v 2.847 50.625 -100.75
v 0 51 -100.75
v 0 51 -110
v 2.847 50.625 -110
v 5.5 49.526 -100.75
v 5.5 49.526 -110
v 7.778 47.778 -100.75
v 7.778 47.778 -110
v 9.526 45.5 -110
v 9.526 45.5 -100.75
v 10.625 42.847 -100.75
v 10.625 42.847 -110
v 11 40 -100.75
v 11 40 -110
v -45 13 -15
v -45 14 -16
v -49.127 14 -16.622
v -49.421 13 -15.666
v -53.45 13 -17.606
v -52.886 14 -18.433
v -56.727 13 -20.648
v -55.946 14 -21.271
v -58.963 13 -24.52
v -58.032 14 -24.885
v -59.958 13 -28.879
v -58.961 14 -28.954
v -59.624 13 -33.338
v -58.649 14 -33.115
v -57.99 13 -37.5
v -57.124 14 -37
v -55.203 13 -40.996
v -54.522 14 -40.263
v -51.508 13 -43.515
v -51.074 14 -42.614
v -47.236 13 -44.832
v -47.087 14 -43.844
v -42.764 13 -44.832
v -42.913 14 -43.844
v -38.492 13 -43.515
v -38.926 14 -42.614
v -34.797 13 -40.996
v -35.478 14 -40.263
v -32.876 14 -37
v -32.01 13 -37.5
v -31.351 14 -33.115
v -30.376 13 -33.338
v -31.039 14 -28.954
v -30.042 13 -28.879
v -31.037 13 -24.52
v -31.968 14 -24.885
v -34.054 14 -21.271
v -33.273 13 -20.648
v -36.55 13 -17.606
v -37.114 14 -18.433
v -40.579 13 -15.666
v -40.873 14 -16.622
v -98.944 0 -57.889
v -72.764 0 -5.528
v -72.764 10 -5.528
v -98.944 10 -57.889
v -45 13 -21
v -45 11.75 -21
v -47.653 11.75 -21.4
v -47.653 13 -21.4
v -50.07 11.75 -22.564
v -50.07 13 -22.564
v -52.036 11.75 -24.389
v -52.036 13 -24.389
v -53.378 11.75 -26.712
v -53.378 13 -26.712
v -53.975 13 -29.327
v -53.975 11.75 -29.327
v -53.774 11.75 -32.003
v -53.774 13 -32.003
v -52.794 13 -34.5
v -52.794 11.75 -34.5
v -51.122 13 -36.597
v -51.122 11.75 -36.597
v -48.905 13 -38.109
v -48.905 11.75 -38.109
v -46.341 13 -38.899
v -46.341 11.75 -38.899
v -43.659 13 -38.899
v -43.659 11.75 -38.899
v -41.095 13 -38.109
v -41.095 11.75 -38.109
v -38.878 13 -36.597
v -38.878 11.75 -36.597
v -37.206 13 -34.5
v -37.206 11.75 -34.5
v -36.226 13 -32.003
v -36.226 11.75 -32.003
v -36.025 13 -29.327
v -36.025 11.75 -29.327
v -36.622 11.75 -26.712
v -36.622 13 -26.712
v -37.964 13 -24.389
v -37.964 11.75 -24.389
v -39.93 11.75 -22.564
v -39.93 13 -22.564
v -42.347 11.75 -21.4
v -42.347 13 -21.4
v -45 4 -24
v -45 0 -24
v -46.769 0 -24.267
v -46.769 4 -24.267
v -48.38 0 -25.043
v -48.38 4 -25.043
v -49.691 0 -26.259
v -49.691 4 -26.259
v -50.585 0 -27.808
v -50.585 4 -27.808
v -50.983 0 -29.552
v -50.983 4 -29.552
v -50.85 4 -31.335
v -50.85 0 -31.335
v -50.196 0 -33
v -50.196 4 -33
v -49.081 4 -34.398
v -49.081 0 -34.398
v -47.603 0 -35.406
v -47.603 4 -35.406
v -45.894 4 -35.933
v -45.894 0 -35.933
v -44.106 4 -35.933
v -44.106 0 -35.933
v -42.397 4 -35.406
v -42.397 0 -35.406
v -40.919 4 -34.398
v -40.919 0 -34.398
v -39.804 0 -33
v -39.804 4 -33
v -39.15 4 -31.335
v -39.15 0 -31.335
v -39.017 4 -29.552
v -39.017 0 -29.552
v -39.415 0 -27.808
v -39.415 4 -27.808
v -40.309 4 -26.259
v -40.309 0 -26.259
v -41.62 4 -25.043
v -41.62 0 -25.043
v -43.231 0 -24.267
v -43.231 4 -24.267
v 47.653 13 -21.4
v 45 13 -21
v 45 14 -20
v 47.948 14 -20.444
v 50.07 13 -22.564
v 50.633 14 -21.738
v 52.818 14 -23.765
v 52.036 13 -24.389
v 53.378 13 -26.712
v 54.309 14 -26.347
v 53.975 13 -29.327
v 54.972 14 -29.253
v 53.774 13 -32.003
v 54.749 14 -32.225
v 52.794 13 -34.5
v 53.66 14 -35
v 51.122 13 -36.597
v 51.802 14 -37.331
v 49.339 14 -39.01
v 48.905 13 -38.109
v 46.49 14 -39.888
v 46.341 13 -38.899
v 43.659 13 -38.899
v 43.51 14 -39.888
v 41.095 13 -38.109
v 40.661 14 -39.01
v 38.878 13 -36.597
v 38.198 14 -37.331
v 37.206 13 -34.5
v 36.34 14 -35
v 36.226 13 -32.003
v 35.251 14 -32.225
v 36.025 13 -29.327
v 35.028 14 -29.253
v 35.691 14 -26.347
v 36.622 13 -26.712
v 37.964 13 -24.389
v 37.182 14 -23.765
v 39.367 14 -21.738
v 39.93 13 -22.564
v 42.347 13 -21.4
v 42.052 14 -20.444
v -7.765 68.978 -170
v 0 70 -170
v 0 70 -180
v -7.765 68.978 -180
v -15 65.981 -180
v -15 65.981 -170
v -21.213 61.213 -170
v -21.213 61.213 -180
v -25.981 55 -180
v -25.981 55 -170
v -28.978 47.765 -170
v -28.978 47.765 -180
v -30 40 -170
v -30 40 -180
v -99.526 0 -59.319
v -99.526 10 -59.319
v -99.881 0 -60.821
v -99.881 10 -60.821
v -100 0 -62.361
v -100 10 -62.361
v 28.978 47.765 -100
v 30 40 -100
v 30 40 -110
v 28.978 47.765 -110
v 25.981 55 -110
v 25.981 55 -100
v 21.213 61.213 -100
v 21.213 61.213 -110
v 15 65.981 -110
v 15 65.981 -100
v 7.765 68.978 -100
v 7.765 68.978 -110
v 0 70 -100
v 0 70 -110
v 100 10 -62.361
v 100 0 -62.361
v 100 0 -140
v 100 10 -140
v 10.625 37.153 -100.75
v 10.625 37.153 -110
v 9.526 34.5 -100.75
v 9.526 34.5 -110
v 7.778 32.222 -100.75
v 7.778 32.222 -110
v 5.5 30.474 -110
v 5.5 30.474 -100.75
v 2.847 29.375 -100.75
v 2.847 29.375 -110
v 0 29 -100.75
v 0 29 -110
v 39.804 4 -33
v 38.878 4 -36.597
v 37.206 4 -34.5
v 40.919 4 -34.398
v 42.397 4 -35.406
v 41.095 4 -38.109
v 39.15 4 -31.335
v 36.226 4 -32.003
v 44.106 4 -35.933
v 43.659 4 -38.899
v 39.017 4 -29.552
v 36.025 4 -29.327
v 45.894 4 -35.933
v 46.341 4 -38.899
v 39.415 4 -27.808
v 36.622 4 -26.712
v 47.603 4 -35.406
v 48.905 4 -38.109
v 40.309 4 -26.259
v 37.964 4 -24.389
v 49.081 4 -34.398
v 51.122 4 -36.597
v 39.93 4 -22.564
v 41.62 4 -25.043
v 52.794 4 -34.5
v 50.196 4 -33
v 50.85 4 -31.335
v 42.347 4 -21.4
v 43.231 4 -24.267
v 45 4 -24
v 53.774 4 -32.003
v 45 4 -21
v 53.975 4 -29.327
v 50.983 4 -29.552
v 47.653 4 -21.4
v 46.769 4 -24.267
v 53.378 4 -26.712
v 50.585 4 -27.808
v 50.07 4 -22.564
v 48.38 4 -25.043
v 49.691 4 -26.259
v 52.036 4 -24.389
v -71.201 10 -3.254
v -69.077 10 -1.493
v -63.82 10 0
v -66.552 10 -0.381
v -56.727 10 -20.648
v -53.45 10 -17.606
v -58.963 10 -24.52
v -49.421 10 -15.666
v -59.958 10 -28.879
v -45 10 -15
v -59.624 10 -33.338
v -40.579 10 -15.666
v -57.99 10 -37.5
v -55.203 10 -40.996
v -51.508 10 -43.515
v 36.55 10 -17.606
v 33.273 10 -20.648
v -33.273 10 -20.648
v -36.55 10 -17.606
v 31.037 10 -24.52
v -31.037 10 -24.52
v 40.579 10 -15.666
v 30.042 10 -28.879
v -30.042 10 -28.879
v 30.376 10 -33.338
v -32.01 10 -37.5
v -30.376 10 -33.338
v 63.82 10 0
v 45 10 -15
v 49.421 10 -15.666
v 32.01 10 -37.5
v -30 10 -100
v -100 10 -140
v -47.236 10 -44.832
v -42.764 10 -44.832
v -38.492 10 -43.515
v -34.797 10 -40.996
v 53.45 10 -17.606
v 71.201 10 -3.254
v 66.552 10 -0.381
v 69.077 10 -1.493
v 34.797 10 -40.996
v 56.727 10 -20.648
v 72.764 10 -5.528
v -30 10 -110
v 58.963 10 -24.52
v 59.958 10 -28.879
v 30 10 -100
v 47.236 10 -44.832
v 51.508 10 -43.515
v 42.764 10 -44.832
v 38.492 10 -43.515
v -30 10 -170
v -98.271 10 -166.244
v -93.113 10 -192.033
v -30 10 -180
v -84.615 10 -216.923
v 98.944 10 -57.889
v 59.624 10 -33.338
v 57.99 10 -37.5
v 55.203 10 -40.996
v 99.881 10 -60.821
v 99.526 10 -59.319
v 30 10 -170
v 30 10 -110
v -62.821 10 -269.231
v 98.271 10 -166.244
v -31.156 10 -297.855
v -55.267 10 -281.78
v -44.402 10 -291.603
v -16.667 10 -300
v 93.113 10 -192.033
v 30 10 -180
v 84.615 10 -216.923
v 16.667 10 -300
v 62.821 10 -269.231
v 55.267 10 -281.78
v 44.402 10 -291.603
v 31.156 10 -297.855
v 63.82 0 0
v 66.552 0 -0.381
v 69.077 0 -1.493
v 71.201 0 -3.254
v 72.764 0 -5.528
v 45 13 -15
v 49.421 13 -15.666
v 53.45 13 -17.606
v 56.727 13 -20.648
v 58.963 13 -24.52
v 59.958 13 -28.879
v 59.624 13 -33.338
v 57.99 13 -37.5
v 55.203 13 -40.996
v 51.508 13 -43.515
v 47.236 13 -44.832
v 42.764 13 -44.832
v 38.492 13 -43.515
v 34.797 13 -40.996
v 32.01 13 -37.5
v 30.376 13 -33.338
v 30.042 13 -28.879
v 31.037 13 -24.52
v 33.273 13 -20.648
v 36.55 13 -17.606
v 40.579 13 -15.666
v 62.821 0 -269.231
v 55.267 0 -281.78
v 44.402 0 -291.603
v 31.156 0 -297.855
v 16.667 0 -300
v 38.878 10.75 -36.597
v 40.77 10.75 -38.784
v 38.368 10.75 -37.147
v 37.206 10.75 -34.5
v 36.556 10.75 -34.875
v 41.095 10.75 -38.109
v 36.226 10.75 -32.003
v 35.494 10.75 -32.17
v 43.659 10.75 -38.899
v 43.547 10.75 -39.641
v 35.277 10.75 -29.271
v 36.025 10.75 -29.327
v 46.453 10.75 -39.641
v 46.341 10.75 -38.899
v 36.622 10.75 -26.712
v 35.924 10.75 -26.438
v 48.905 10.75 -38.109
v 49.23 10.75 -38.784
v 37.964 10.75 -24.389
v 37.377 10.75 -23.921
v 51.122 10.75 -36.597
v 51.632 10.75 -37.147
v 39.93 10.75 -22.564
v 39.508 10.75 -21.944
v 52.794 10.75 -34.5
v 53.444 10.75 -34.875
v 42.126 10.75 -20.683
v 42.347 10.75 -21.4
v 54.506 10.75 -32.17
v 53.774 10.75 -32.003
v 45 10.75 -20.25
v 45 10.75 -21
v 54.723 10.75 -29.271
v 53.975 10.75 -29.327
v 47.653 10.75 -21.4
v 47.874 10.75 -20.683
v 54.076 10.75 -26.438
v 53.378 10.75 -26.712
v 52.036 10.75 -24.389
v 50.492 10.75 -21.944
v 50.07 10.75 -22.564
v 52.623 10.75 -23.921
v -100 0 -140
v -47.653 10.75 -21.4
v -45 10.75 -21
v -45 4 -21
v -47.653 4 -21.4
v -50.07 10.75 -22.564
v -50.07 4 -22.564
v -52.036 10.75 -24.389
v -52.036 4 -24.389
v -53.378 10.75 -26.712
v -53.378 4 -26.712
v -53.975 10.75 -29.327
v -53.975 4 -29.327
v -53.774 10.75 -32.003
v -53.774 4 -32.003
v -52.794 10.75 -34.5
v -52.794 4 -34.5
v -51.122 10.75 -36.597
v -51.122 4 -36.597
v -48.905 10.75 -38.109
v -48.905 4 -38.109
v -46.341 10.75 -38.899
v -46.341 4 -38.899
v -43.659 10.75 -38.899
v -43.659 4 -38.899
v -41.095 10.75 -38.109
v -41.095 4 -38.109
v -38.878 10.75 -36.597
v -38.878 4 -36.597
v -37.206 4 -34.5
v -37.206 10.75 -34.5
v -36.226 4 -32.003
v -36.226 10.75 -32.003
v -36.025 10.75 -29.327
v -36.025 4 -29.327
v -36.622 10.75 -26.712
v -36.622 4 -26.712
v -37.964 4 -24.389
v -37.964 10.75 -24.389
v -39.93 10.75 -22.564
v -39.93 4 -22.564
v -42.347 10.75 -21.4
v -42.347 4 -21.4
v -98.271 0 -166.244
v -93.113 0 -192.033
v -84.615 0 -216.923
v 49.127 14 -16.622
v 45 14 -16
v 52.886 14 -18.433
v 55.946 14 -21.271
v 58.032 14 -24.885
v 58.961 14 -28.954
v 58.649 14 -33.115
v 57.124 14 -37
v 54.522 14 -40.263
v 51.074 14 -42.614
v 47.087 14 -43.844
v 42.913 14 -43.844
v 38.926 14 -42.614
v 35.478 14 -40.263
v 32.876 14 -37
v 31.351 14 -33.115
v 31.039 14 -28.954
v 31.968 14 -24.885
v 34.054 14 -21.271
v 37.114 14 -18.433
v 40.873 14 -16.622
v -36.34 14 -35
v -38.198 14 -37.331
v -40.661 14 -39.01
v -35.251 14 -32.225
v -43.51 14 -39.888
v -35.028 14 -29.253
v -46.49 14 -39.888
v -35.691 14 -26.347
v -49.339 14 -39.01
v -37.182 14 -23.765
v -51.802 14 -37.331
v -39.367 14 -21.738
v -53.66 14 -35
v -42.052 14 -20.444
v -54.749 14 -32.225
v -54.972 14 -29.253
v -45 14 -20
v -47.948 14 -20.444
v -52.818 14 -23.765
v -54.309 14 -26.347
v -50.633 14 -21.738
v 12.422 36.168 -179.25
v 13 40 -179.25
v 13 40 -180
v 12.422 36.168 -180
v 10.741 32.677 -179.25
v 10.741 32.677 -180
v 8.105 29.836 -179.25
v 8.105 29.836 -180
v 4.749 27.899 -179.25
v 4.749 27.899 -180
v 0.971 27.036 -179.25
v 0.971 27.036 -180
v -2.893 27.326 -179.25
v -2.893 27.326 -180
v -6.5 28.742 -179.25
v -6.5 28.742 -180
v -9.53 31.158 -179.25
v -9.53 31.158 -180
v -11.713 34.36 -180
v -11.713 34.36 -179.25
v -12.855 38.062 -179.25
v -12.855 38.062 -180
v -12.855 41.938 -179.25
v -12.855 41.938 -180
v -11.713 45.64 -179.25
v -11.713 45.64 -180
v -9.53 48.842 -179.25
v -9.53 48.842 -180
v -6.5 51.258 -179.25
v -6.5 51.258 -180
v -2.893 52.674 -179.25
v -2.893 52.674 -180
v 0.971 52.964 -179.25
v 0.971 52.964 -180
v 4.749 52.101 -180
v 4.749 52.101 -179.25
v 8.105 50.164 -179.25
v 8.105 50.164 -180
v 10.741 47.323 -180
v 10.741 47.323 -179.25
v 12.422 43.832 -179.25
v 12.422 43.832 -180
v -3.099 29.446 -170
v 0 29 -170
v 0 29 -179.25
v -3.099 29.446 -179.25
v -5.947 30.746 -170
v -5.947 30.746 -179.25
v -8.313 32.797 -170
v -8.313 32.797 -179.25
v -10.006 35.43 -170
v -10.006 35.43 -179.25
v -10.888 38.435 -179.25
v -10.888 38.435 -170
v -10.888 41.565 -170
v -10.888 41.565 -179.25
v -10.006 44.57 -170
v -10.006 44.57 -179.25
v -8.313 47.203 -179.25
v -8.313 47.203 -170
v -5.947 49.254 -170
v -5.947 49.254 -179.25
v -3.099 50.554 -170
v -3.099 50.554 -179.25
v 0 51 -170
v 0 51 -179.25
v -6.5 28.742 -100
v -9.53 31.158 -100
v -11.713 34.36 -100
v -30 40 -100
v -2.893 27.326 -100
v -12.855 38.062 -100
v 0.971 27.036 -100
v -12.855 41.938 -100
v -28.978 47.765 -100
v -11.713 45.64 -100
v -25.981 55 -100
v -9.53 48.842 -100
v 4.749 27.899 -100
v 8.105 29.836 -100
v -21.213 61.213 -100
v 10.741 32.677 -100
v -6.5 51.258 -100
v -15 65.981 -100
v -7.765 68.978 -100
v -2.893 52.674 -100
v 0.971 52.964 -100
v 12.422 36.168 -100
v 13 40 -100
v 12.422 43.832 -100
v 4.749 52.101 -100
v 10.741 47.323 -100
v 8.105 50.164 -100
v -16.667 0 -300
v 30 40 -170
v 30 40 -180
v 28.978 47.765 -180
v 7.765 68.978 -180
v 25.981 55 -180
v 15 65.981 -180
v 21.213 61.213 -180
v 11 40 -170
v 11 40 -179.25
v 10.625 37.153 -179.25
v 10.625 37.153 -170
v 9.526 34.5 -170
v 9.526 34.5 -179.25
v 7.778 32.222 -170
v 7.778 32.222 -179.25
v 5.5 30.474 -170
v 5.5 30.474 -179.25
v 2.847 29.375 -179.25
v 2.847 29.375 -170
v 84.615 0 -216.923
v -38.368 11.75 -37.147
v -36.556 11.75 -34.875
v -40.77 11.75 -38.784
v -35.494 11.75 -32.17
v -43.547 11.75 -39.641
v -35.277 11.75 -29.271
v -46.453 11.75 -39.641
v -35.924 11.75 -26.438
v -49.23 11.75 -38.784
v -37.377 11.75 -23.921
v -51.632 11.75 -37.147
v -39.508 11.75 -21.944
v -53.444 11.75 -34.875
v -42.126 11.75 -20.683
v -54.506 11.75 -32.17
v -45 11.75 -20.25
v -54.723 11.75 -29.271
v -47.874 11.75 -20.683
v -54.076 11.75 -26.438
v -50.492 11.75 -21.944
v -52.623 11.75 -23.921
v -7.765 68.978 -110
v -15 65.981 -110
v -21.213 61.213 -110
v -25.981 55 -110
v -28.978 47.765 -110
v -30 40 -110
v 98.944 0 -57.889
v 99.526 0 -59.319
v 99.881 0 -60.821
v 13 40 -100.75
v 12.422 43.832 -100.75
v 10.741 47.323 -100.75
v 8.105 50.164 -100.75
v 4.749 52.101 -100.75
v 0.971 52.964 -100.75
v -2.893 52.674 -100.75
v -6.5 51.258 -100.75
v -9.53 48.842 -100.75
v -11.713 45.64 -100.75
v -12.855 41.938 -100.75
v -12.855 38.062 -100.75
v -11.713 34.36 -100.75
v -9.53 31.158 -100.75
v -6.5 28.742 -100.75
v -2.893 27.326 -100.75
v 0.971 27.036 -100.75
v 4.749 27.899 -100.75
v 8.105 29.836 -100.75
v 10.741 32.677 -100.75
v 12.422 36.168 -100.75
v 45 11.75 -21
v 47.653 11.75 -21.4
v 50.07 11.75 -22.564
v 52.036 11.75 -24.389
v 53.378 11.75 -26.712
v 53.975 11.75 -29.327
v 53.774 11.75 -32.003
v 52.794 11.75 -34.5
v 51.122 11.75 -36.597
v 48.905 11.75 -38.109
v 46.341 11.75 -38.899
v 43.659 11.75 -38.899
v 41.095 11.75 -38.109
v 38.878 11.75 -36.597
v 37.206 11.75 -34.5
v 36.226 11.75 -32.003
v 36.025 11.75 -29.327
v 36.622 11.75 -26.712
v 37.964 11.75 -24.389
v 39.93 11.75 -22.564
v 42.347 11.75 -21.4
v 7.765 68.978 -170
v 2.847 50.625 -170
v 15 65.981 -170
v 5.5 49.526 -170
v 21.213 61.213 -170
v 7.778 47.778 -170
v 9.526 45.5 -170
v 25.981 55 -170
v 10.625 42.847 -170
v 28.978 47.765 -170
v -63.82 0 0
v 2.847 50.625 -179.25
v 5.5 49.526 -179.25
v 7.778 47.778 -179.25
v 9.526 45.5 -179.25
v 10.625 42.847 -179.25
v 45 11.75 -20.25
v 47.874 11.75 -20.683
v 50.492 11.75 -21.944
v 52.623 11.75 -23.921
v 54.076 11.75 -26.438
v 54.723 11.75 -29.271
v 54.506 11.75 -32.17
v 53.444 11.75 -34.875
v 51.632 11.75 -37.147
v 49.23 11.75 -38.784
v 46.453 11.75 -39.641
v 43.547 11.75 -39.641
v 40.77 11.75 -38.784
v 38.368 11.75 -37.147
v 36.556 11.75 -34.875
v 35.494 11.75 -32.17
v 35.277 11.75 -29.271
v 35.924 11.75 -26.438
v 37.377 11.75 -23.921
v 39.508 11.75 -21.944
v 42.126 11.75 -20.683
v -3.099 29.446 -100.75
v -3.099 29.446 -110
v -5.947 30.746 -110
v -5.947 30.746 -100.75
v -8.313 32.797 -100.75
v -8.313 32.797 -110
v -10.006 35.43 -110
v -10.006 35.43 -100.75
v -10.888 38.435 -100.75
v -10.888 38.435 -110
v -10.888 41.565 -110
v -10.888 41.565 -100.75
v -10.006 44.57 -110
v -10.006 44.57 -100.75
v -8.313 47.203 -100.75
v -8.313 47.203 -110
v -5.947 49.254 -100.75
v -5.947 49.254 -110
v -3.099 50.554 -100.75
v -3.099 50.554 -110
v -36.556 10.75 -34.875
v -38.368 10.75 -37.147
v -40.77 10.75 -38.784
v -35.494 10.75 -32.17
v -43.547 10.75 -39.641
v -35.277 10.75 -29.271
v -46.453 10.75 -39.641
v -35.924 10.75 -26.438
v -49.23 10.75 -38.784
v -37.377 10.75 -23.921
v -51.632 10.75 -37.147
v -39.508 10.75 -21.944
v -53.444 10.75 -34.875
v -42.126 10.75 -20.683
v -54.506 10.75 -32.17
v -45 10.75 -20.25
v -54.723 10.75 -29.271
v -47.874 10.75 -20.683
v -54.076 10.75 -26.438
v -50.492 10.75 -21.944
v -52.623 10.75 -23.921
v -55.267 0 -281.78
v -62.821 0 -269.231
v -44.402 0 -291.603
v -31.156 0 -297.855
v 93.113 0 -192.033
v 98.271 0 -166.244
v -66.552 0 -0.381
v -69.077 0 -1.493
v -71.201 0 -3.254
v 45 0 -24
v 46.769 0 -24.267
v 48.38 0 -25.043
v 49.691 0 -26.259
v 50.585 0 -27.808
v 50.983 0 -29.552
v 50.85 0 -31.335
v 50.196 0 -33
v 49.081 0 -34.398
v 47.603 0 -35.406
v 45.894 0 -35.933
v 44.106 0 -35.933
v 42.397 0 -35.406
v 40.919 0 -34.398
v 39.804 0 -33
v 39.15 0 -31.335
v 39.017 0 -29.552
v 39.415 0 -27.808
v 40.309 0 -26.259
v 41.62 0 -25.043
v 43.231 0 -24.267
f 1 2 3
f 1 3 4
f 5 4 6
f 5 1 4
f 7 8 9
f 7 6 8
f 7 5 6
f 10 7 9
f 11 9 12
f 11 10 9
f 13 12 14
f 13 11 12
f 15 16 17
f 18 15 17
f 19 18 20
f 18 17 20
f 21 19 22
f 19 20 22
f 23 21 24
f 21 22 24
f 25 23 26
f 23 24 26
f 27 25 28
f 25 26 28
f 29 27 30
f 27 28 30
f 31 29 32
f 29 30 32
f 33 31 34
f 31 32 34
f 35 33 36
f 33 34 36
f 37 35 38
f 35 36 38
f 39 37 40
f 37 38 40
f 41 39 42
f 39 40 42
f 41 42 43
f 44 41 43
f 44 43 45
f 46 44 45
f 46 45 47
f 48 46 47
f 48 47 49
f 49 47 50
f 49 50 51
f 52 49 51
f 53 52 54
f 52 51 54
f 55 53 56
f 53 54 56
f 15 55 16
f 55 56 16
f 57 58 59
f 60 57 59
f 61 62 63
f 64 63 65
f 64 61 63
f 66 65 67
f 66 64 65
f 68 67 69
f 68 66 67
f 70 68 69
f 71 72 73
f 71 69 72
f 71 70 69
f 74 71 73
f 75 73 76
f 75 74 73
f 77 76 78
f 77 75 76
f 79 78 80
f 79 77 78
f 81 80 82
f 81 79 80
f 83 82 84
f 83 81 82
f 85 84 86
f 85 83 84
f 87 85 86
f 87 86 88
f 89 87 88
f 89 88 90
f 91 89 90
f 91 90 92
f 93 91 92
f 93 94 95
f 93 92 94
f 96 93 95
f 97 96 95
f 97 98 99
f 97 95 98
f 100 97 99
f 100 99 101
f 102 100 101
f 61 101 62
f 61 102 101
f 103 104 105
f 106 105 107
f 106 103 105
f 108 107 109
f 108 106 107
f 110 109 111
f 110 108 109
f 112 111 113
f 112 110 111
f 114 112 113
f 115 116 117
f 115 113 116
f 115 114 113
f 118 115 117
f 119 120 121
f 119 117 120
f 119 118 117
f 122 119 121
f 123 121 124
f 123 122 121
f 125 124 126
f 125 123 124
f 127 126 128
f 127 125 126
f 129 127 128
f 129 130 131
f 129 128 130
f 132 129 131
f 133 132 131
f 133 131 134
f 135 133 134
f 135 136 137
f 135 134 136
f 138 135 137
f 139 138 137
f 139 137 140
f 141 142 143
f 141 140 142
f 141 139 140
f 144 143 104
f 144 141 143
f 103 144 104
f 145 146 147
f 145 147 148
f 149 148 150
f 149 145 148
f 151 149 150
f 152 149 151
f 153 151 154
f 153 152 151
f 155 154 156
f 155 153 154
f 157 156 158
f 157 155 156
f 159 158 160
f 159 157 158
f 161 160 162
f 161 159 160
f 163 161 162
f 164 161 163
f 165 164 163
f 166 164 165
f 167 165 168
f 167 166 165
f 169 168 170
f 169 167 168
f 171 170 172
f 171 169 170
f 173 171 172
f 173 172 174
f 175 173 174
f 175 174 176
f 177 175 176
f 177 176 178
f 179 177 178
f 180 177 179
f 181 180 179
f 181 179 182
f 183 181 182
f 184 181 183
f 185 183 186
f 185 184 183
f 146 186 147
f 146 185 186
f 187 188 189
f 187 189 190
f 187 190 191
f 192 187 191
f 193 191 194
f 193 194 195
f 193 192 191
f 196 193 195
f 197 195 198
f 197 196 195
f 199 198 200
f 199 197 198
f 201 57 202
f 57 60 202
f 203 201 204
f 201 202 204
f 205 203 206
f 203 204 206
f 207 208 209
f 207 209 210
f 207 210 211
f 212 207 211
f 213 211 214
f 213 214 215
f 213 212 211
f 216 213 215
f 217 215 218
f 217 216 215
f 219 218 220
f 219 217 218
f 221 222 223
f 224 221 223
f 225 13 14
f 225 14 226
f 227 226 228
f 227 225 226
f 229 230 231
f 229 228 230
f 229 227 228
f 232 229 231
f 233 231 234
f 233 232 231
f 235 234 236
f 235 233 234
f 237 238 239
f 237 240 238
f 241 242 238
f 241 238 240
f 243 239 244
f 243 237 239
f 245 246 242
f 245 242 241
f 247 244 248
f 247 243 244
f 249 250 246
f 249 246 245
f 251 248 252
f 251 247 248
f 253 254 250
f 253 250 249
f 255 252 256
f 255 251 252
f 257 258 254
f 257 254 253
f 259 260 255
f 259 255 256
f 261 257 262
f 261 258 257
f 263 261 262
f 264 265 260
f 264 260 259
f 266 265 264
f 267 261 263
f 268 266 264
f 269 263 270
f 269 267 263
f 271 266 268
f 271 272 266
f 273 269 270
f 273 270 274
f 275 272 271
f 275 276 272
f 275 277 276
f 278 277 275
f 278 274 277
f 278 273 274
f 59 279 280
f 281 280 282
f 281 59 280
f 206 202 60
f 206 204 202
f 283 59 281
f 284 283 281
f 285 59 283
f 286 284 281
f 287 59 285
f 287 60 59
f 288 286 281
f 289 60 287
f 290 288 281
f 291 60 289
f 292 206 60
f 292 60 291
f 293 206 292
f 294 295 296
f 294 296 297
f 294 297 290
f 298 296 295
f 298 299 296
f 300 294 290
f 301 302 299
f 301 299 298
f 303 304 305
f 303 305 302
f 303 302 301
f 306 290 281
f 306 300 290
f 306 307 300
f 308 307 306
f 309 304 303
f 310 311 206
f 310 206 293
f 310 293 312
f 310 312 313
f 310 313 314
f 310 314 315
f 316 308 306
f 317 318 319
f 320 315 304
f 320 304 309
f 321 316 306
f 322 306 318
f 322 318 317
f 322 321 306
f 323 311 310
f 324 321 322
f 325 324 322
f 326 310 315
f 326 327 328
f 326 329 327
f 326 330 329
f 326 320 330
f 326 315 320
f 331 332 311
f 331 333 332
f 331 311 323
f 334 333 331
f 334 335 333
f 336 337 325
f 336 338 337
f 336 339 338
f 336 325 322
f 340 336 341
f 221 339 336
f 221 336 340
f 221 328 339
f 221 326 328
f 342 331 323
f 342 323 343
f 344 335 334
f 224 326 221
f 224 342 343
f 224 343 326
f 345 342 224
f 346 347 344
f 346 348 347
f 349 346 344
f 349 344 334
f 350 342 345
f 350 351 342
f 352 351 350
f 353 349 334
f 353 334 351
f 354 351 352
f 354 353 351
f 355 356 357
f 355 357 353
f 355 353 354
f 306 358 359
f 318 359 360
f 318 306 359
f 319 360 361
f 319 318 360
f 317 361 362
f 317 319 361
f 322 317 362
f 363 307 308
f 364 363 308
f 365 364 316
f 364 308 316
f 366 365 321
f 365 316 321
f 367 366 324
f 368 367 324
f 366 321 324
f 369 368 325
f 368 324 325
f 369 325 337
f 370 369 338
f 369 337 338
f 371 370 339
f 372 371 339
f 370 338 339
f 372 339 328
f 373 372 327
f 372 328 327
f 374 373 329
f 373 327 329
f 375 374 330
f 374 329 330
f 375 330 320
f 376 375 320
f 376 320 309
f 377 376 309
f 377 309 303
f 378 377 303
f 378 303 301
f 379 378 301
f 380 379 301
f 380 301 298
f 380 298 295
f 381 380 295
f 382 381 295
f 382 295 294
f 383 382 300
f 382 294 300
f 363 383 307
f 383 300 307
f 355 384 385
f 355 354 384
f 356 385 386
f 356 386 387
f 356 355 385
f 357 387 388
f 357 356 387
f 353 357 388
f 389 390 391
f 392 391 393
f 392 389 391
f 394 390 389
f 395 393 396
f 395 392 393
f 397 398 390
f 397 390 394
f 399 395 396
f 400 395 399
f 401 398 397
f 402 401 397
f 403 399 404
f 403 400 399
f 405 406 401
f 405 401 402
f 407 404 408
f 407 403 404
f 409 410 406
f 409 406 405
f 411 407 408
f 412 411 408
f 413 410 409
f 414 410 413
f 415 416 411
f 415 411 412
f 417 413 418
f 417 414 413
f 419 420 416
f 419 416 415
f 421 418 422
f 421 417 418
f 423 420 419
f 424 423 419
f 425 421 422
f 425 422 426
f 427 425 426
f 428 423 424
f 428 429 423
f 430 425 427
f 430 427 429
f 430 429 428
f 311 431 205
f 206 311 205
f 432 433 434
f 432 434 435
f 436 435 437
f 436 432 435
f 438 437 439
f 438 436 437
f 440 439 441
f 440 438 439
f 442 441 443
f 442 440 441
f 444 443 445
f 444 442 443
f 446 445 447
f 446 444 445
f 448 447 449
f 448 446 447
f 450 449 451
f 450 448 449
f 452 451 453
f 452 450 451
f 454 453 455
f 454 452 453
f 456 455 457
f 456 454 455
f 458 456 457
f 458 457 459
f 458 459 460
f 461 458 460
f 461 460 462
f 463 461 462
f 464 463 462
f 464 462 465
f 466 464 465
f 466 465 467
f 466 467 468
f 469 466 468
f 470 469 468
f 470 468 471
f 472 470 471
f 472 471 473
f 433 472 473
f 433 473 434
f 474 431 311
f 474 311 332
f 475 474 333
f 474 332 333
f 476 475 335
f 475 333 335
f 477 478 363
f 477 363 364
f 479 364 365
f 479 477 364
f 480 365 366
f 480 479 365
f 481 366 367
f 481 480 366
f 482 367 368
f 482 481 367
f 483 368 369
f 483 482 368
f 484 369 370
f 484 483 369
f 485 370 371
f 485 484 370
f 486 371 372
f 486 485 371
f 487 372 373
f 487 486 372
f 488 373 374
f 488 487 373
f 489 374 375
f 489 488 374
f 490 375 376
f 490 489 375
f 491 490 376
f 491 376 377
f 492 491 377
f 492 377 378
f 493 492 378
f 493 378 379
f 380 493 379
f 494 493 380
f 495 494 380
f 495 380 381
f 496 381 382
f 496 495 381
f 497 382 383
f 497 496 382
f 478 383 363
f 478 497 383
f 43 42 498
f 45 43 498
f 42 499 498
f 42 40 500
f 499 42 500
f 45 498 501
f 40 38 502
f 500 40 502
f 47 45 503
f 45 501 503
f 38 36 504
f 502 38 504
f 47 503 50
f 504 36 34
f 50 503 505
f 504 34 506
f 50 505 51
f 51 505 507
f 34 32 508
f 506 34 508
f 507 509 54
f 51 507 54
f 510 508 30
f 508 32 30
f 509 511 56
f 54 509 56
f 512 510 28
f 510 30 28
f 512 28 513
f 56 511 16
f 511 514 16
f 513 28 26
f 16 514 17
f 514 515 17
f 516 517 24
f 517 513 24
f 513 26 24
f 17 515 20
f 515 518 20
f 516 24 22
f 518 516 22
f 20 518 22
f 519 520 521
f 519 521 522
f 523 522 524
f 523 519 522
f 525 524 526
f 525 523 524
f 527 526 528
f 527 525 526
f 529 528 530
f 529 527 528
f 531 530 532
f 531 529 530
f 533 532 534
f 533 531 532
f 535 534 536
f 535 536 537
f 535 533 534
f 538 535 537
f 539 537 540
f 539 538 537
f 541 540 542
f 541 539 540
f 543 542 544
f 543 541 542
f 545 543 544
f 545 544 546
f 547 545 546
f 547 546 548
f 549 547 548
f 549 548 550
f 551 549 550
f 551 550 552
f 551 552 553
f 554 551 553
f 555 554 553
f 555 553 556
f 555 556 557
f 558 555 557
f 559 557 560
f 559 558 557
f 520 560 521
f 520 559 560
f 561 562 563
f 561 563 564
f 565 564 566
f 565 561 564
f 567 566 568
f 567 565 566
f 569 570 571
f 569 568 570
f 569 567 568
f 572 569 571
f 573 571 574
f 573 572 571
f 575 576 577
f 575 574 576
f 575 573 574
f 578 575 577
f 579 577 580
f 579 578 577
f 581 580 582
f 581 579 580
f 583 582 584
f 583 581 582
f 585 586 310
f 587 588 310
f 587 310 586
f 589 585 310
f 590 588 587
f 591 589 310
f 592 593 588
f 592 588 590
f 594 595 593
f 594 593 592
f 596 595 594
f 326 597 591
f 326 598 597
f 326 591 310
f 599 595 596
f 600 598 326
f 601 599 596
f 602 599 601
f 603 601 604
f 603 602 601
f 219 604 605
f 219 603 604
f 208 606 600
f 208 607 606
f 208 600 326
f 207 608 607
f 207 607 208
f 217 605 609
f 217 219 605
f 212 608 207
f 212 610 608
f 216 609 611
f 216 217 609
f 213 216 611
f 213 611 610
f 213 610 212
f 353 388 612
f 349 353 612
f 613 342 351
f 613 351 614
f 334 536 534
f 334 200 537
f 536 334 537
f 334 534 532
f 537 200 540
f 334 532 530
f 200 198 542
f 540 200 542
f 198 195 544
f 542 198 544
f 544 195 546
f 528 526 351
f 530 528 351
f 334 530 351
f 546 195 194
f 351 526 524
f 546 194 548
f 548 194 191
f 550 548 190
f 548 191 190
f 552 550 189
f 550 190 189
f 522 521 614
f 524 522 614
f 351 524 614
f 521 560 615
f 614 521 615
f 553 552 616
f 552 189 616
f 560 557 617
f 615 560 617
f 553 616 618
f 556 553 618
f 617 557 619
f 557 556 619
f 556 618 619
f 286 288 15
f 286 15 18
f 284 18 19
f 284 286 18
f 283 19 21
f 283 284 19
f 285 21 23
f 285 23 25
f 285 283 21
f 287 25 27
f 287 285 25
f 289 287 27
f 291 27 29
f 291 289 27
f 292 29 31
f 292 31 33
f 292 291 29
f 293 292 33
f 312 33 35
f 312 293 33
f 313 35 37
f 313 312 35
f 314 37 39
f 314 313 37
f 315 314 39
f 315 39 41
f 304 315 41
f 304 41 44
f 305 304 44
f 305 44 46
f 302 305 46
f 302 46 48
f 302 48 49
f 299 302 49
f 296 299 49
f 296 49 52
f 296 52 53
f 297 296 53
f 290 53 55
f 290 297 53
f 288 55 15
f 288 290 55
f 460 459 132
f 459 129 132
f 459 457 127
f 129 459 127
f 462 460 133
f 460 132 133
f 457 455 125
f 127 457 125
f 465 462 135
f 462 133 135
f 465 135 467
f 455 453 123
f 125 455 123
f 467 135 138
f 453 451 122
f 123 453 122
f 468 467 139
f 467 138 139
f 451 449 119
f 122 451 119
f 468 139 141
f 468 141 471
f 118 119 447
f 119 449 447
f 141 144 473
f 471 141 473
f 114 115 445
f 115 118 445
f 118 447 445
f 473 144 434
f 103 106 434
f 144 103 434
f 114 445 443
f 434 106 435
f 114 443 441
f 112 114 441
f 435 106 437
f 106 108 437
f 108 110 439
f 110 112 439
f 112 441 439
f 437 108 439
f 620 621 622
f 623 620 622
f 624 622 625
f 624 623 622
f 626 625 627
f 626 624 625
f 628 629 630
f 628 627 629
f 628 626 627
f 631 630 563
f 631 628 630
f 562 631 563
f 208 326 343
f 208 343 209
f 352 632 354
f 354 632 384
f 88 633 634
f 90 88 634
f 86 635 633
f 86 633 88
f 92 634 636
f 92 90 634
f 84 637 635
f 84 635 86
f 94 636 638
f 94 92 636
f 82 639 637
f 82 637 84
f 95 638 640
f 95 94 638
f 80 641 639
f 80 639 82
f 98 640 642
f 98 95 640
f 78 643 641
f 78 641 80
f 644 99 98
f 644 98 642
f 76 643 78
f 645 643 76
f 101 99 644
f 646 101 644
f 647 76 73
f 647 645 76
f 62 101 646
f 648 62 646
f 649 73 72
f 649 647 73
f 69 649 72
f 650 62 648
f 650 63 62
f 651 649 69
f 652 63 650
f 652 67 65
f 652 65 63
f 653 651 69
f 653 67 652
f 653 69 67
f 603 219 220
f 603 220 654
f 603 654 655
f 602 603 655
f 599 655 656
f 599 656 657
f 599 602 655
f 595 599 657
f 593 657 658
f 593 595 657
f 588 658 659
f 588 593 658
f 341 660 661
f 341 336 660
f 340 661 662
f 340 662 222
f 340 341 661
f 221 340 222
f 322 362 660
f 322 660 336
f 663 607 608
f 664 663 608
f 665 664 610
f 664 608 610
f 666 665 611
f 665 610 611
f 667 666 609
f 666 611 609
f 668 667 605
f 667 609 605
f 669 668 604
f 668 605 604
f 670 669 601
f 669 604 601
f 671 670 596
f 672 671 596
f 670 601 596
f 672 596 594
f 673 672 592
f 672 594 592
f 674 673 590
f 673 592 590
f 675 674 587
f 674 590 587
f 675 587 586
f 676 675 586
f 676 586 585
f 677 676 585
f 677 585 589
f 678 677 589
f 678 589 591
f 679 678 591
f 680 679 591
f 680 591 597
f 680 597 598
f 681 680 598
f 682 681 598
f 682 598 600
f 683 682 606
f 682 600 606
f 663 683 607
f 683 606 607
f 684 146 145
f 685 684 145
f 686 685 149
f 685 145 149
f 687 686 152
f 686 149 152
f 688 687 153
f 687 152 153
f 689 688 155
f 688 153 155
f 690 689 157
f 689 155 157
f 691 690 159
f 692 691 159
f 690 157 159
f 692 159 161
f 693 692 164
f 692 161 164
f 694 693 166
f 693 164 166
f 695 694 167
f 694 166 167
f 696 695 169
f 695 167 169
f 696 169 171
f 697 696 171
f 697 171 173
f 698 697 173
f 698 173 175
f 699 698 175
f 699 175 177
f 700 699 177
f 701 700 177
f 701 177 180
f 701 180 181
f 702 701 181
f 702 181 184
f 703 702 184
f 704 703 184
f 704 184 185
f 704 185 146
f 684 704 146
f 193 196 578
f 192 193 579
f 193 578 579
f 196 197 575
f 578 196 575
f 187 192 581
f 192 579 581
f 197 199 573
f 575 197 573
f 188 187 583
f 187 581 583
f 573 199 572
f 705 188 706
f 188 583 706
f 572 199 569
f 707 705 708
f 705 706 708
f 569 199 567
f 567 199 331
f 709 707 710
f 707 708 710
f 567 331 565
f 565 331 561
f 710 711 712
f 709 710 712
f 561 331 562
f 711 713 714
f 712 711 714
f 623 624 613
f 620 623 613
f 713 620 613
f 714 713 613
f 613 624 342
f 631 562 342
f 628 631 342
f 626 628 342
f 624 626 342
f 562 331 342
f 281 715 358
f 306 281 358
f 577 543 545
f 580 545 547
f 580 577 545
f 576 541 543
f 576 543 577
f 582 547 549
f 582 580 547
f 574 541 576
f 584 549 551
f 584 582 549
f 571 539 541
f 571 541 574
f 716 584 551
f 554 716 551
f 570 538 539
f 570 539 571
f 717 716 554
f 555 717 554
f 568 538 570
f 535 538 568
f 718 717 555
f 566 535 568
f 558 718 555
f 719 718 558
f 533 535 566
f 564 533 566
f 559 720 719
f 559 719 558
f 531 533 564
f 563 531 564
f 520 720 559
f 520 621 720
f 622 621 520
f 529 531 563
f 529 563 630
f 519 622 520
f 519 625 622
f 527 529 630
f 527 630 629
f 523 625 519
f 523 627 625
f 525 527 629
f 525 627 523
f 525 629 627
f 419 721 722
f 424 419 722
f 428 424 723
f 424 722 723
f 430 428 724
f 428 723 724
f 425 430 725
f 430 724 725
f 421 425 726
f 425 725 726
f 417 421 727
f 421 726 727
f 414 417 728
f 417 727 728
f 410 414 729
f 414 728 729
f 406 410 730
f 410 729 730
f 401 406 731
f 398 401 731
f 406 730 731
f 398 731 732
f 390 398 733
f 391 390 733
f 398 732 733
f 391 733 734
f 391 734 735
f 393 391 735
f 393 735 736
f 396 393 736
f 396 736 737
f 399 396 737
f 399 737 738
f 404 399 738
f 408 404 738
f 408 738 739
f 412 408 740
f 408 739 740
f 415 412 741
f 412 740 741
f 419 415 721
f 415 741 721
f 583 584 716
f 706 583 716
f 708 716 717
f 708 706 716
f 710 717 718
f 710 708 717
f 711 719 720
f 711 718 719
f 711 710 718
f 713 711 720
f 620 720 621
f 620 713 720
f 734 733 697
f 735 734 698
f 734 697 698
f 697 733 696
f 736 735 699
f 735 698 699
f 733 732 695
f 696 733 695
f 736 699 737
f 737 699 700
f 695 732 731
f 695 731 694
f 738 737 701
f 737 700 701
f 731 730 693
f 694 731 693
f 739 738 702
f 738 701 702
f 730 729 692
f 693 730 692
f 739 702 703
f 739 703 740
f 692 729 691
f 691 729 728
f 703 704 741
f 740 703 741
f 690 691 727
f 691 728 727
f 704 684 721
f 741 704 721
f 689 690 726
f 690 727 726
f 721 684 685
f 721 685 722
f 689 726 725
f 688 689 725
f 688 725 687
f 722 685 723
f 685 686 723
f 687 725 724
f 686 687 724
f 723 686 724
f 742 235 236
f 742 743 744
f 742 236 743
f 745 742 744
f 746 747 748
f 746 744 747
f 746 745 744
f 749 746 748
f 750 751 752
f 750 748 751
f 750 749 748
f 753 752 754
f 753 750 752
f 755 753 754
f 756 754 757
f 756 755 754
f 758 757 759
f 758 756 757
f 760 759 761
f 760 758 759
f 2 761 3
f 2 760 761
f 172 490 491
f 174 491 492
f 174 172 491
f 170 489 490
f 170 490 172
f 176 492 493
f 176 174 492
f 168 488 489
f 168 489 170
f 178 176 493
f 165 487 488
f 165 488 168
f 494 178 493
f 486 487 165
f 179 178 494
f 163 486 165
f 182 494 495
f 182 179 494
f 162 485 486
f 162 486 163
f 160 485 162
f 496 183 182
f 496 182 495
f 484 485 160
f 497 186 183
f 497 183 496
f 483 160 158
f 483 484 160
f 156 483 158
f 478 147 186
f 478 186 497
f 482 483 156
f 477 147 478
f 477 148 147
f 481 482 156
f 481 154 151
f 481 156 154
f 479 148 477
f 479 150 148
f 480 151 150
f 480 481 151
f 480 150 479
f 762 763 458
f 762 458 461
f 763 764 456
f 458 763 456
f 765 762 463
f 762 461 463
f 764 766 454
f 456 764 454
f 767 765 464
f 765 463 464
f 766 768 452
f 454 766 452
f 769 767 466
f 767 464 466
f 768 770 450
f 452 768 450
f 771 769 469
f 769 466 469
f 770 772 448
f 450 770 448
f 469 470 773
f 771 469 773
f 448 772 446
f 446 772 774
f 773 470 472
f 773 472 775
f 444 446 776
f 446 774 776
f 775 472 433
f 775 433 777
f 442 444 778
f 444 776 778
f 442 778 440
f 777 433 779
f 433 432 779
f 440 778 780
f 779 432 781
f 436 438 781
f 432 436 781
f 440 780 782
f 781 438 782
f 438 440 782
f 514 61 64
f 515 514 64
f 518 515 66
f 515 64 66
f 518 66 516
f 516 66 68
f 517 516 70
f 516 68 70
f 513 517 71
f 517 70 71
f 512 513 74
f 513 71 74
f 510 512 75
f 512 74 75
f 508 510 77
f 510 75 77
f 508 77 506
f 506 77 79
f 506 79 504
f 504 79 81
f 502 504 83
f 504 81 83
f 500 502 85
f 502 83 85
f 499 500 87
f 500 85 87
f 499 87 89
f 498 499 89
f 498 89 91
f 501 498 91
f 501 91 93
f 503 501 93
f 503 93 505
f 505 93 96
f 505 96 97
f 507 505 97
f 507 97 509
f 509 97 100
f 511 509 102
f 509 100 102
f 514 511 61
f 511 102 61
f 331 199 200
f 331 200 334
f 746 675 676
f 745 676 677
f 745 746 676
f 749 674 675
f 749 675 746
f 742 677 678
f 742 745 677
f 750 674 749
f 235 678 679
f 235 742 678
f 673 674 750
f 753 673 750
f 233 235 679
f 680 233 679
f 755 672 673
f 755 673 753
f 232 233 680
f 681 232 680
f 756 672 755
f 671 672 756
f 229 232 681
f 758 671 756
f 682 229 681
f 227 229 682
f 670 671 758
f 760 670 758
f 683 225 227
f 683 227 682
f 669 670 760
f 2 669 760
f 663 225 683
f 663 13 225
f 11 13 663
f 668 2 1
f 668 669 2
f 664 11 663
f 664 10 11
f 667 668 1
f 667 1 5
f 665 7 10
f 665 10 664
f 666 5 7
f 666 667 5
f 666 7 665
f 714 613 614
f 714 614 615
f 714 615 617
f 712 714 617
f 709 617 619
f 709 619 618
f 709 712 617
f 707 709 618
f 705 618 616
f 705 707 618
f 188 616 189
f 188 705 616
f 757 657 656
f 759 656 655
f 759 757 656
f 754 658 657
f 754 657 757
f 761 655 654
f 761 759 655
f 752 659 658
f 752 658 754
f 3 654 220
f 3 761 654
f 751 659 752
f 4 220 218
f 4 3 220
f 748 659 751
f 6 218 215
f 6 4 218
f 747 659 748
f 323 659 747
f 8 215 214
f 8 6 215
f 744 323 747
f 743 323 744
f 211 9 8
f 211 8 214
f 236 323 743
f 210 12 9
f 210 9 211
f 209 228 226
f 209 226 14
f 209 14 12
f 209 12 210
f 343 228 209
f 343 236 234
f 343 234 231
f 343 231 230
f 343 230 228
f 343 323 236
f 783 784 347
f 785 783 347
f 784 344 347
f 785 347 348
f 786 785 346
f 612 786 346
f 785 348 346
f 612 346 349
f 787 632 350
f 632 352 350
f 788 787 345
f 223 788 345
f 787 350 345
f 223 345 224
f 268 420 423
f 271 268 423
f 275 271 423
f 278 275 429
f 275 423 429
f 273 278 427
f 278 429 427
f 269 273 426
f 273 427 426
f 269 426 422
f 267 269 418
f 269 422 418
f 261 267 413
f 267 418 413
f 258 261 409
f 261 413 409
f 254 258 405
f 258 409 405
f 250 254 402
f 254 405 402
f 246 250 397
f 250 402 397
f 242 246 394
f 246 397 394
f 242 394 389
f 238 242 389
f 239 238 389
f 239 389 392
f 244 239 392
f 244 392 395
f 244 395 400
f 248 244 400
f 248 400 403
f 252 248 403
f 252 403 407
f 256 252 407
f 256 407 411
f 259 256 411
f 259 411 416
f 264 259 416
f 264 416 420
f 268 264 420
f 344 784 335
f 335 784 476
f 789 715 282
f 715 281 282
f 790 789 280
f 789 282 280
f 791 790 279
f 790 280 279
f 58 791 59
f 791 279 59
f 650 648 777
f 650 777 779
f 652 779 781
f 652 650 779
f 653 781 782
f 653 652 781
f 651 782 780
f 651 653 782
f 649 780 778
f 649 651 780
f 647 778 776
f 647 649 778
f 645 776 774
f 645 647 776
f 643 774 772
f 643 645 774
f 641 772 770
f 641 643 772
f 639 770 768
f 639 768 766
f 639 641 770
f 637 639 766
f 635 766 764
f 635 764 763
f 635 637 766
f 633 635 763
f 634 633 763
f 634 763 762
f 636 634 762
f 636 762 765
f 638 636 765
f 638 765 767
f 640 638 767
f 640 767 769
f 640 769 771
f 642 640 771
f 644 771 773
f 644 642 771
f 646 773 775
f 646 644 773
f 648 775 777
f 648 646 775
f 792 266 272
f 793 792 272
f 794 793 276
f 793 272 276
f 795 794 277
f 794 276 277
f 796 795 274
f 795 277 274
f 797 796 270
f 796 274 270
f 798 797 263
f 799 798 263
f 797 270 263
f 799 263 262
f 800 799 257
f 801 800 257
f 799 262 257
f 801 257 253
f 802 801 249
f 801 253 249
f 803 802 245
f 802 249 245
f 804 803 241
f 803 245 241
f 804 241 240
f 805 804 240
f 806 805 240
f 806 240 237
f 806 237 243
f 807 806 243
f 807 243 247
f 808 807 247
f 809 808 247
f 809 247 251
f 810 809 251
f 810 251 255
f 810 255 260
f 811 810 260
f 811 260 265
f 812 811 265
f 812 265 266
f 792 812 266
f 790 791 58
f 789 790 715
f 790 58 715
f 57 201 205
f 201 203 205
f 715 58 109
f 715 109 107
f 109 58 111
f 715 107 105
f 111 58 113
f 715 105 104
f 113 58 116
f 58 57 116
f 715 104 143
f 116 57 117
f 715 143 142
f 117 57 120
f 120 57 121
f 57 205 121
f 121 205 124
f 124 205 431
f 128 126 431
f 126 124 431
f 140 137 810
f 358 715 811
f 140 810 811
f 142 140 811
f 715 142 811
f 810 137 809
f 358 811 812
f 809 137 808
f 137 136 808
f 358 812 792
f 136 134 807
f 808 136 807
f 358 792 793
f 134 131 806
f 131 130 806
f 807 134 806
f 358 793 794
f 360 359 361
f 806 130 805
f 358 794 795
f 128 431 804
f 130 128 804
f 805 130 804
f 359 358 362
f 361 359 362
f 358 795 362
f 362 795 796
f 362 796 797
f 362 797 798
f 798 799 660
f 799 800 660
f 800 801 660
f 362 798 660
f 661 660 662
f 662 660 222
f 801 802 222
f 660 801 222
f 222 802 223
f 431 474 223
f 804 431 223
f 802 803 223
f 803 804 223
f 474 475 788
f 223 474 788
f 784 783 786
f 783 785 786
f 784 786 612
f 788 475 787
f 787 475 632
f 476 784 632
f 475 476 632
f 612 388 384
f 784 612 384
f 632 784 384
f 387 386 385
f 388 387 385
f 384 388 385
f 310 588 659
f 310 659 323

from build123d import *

# Parameters (mm, degrees)
EXTRUDE_1_DEPTH            = 10
EXTRUDE_START              = -100
EXTRUDE_3_DEPTH            = 80
SKETCH_5_W                 = 80
SKETCH_5_H                 = 60
CUT_EXTRUDE_2_DEPTH        = 110
FILLET_1_R                 = 50
FILLET_2_R                 = 200
SKETCH_7_R                 = 9
CUT_EXTRUDE_6_DEPTH        = 6
SKETCH_10_R                = 6
CUT_EXTRUDE_7_DEPTH        = 28
SKETCH_12_R                = 15
EXTRUDE_5_DEPTH            = 4
SKETCH_13_R                = 9
CUT_EXTRUDE_9_DEPTH        = 4
CUT_EXTRUDE_START          = -2.25
SKETCH_14_R                = 9.75
CUT_EXTRUDE_4141_DEPTH     = 1
CHAMFER_1_SIZE             = 1
CHAMFER_1_OF_MIRROR_1_SIZE = 1
SKETCH_16_R                = 13
CUT_EXTRUDE_10_DEPTH       = 0.75
CUT_EXTRUDE_START_2        = -0.75
SKETCH_17_R                = 13
CUT_EXTRUDE_11_DEPTH       = 0.75
CHAMFER_2_SIZE             = 30
CHAMFER_2_SIZE2            = 60
CHAMFER_3_SIZE             = 60
CHAMFER_3_SIZE2            = 30
FILLET_3_R                 = 10


with BuildPart() as part:
    # 草图1 → 凸台-拉伸1 (new body)
    with BuildSketch(Plane(origin=(0, 0, 0), x_dir=(1, 0, 0), z_dir=(0, 1, 0))):
        Polygon((-100, 0), (100, 0), (100, 180), (50, 300), (-50, 300), (-100, 180), align=None)
    extrude(amount=EXTRUDE_1_DEPTH)

    # 草图4 → 凸台-拉伸3 (add)
    with BuildSketch(Plane.XY.offset(EXTRUDE_START)):
        with BuildLine():
            Line((0, 29), (0, 10))
            Line((0, 10), (30, 10))
            Line((30, 10), (30, 40))
            ThreePointArc((30, 40), (21.213203436, 61.213203436), (0, 70))
            Line((0, 70), (0, 51))
            ThreePointArc((0, 51), (7.778174593, 47.778174593), (11, 40))
            ThreePointArc((11, 40), (7.778174593, 32.221825407), (0, 29))
        make_face()
        with BuildLine():
            Line((-30, 10), (0, 10))
            Line((0, 10), (0, 29))
            ThreePointArc((0, 29), (-11, 40), (0, 51))
            Line((0, 51), (0, 70))
            ThreePointArc((0, 70), (-21.213203436, 61.213203436), (-30, 40))
            Line((-30, 40), (-30, 10))
        make_face()
    extrude(amount=-EXTRUDE_3_DEPTH)

    # 草图5 → 切除-拉伸2 (cut)
    with BuildSketch(Plane(origin=(0, 10, 0), x_dir=(1, 0, 0), z_dir=(0, 1, 0))):
        with Locations((0, 140)):
            Rectangle(SKETCH_5_W, SKETCH_5_H)
    extrude(amount=CUT_EXTRUDE_2_DEPTH, mode=Mode.SUBTRACT)

    # 圆角1
    fillet_1_edges = [part.edges().sort_by_distance(p)[0] for p in [
        (-50, 5, -300),
        (50, 5, -300),
    ]]
    fillet(fillet_1_edges, radius=FILLET_1_R)

    # 圆角2
    fillet_2_edges = [part.edges().sort_by_distance(p)[0] for p in [
        (-100, 5, -180),
        (100, 5, -180),
    ]]
    fillet(fillet_2_edges, radius=FILLET_2_R)

    # 草图7 → 切除-拉伸6 (cut)
    with BuildSketch(Plane(origin=(0, 10, 0), x_dir=(1, 0, 0), z_dir=(0, 1, 0))):
        with Locations(Location((45, 30, 0), (0, 0, 270))):
            Circle(SKETCH_7_R)
    cut_extrude_6 = extrude(amount=-CUT_EXTRUDE_6_DEPTH, mode=Mode.SUBTRACT)

    # 草图10 → 切除-拉伸7 (cut)
    with BuildSketch(Plane(origin=(0, 4, 0), x_dir=(1, 0, 0), z_dir=(0, 1, 0))):
        with Locations(Location((45, 30, 0), (0, 0, 270))):
            Circle(SKETCH_10_R)
    cut_extrude_7 = extrude(amount=-CUT_EXTRUDE_7_DEPTH, mode=Mode.SUBTRACT)

    # 草图12 → 凸台-拉伸5 (add)
    with BuildSketch(Plane(origin=(0, 10, 0), x_dir=(1, 0, 0), z_dir=(0, 1, 0))):
        with Locations(Location((45, 30, 0), (0, 0, 270))):
            Circle(SKETCH_12_R)
    extrude_5 = extrude(amount=EXTRUDE_5_DEPTH)

    # 草图13 → 切除-拉伸9 (cut)
    with BuildSketch(Plane(origin=(0, 14, 0), x_dir=(1, 0, 0), z_dir=(0, 1, 0))):
        with Locations(Location((45, 30, 0), (0, 0, 270))):
            Circle(SKETCH_13_R)
    cut_extrude_9 = extrude(amount=-CUT_EXTRUDE_9_DEPTH, mode=Mode.SUBTRACT)

    # 草图14 → Cut-Extrude 4141 (cut)
    with BuildSketch(Plane(origin=(0, 14, 0), x_dir=(1, 0, 0), z_dir=(0, 1, 0)).offset(CUT_EXTRUDE_START)):
        with Locations(Location((45, 30, 0), (0, 0, 270))):
            Circle(SKETCH_14_R)
    cut_extrude_4141 = extrude(amount=-CUT_EXTRUDE_4141_DEPTH, mode=Mode.SUBTRACT)

    # 倒角1
    chamfer_1_edges = [part.edges().sort_by_distance(p)[0] for p in [
        (45, 14, -45),
        (45, 14, -39),
    ]]
    chamfer(chamfer_1_edges, length=CHAMFER_1_SIZE)

    # 镜向1: 切除-拉伸6, 切除-拉伸7, 凸台-拉伸5, 切除-拉伸9, Cut-Extrude 4141 across plane
    add(cut_extrude_6.mirror(Plane.ZY), mode=Mode.SUBTRACT)
    add(cut_extrude_7.mirror(Plane.ZY), mode=Mode.SUBTRACT)
    add(extrude_5.mirror(Plane.ZY))
    add(cut_extrude_9.mirror(Plane.ZY), mode=Mode.SUBTRACT)
    add(cut_extrude_4141.mirror(Plane.ZY), mode=Mode.SUBTRACT)

    # 倒角1 of 镜向1
    chamfer_1_of_mirror_1_edges = [part.edges().sort_by_distance(p)[0] for p in [
        (-45, 14, -45),
        (-45, 14, -39),
    ]]
    chamfer(chamfer_1_of_mirror_1_edges, length=CHAMFER_1_OF_MIRROR_1_SIZE)

    # 草图16 → 切除-拉伸10 (cut)
    with BuildSketch(Plane.XY.offset(-100)):
        with Locations((0, 40)):
            Circle(SKETCH_16_R)
    extrude(amount=-CUT_EXTRUDE_10_DEPTH, mode=Mode.SUBTRACT)

    # 草图17 → 切除-拉伸11 (cut)
    with BuildSketch(Plane(origin=(0, 0, -180), x_dir=(-1, 0, 0), z_dir=(0, 0, -1)).offset(CUT_EXTRUDE_START_2)):
        with Locations(Location((0, 40, 0), (0, 0, 180))):
            Circle(SKETCH_17_R)
    extrude(amount=CUT_EXTRUDE_11_DEPTH, mode=Mode.SUBTRACT)

    # 倒角2
    chamfer_2_edges = [part.edges().sort_by_distance(p)[0] for p in [
        (100, 5, 0),
    ]]
    chamfer_2_side = [part.faces().sort_by_distance(p)[0] for p in [
        (0, 5, 0),
    ]]
    chamfer(chamfer_2_edges, length=CHAMFER_2_SIZE, length2=CHAMFER_2_SIZE2, reference=chamfer_2_side[0])

    # 倒角3
    chamfer_3_edges = [part.edges().sort_by_distance(p)[0] for p in [
        (-100, 5, 0),
    ]]
    chamfer_3_side = [part.faces().sort_by_distance(p)[0] for p in [
        (-100, 5, -70),
    ]]
    chamfer(chamfer_3_edges, length=CHAMFER_3_SIZE, length2=CHAMFER_3_SIZE2, reference=chamfer_3_side[0])

    # 圆角3
    fillet_3_edges = [part.edges().sort_by_distance(p)[0] for p in [
        (100, 5, -60),
        (70, 5, 0),
        (-70, 5, 0),
        (-100, 5, -60),
    ]]
    fillet(fillet_3_edges, radius=FILLET_3_R)


solid = part.part
